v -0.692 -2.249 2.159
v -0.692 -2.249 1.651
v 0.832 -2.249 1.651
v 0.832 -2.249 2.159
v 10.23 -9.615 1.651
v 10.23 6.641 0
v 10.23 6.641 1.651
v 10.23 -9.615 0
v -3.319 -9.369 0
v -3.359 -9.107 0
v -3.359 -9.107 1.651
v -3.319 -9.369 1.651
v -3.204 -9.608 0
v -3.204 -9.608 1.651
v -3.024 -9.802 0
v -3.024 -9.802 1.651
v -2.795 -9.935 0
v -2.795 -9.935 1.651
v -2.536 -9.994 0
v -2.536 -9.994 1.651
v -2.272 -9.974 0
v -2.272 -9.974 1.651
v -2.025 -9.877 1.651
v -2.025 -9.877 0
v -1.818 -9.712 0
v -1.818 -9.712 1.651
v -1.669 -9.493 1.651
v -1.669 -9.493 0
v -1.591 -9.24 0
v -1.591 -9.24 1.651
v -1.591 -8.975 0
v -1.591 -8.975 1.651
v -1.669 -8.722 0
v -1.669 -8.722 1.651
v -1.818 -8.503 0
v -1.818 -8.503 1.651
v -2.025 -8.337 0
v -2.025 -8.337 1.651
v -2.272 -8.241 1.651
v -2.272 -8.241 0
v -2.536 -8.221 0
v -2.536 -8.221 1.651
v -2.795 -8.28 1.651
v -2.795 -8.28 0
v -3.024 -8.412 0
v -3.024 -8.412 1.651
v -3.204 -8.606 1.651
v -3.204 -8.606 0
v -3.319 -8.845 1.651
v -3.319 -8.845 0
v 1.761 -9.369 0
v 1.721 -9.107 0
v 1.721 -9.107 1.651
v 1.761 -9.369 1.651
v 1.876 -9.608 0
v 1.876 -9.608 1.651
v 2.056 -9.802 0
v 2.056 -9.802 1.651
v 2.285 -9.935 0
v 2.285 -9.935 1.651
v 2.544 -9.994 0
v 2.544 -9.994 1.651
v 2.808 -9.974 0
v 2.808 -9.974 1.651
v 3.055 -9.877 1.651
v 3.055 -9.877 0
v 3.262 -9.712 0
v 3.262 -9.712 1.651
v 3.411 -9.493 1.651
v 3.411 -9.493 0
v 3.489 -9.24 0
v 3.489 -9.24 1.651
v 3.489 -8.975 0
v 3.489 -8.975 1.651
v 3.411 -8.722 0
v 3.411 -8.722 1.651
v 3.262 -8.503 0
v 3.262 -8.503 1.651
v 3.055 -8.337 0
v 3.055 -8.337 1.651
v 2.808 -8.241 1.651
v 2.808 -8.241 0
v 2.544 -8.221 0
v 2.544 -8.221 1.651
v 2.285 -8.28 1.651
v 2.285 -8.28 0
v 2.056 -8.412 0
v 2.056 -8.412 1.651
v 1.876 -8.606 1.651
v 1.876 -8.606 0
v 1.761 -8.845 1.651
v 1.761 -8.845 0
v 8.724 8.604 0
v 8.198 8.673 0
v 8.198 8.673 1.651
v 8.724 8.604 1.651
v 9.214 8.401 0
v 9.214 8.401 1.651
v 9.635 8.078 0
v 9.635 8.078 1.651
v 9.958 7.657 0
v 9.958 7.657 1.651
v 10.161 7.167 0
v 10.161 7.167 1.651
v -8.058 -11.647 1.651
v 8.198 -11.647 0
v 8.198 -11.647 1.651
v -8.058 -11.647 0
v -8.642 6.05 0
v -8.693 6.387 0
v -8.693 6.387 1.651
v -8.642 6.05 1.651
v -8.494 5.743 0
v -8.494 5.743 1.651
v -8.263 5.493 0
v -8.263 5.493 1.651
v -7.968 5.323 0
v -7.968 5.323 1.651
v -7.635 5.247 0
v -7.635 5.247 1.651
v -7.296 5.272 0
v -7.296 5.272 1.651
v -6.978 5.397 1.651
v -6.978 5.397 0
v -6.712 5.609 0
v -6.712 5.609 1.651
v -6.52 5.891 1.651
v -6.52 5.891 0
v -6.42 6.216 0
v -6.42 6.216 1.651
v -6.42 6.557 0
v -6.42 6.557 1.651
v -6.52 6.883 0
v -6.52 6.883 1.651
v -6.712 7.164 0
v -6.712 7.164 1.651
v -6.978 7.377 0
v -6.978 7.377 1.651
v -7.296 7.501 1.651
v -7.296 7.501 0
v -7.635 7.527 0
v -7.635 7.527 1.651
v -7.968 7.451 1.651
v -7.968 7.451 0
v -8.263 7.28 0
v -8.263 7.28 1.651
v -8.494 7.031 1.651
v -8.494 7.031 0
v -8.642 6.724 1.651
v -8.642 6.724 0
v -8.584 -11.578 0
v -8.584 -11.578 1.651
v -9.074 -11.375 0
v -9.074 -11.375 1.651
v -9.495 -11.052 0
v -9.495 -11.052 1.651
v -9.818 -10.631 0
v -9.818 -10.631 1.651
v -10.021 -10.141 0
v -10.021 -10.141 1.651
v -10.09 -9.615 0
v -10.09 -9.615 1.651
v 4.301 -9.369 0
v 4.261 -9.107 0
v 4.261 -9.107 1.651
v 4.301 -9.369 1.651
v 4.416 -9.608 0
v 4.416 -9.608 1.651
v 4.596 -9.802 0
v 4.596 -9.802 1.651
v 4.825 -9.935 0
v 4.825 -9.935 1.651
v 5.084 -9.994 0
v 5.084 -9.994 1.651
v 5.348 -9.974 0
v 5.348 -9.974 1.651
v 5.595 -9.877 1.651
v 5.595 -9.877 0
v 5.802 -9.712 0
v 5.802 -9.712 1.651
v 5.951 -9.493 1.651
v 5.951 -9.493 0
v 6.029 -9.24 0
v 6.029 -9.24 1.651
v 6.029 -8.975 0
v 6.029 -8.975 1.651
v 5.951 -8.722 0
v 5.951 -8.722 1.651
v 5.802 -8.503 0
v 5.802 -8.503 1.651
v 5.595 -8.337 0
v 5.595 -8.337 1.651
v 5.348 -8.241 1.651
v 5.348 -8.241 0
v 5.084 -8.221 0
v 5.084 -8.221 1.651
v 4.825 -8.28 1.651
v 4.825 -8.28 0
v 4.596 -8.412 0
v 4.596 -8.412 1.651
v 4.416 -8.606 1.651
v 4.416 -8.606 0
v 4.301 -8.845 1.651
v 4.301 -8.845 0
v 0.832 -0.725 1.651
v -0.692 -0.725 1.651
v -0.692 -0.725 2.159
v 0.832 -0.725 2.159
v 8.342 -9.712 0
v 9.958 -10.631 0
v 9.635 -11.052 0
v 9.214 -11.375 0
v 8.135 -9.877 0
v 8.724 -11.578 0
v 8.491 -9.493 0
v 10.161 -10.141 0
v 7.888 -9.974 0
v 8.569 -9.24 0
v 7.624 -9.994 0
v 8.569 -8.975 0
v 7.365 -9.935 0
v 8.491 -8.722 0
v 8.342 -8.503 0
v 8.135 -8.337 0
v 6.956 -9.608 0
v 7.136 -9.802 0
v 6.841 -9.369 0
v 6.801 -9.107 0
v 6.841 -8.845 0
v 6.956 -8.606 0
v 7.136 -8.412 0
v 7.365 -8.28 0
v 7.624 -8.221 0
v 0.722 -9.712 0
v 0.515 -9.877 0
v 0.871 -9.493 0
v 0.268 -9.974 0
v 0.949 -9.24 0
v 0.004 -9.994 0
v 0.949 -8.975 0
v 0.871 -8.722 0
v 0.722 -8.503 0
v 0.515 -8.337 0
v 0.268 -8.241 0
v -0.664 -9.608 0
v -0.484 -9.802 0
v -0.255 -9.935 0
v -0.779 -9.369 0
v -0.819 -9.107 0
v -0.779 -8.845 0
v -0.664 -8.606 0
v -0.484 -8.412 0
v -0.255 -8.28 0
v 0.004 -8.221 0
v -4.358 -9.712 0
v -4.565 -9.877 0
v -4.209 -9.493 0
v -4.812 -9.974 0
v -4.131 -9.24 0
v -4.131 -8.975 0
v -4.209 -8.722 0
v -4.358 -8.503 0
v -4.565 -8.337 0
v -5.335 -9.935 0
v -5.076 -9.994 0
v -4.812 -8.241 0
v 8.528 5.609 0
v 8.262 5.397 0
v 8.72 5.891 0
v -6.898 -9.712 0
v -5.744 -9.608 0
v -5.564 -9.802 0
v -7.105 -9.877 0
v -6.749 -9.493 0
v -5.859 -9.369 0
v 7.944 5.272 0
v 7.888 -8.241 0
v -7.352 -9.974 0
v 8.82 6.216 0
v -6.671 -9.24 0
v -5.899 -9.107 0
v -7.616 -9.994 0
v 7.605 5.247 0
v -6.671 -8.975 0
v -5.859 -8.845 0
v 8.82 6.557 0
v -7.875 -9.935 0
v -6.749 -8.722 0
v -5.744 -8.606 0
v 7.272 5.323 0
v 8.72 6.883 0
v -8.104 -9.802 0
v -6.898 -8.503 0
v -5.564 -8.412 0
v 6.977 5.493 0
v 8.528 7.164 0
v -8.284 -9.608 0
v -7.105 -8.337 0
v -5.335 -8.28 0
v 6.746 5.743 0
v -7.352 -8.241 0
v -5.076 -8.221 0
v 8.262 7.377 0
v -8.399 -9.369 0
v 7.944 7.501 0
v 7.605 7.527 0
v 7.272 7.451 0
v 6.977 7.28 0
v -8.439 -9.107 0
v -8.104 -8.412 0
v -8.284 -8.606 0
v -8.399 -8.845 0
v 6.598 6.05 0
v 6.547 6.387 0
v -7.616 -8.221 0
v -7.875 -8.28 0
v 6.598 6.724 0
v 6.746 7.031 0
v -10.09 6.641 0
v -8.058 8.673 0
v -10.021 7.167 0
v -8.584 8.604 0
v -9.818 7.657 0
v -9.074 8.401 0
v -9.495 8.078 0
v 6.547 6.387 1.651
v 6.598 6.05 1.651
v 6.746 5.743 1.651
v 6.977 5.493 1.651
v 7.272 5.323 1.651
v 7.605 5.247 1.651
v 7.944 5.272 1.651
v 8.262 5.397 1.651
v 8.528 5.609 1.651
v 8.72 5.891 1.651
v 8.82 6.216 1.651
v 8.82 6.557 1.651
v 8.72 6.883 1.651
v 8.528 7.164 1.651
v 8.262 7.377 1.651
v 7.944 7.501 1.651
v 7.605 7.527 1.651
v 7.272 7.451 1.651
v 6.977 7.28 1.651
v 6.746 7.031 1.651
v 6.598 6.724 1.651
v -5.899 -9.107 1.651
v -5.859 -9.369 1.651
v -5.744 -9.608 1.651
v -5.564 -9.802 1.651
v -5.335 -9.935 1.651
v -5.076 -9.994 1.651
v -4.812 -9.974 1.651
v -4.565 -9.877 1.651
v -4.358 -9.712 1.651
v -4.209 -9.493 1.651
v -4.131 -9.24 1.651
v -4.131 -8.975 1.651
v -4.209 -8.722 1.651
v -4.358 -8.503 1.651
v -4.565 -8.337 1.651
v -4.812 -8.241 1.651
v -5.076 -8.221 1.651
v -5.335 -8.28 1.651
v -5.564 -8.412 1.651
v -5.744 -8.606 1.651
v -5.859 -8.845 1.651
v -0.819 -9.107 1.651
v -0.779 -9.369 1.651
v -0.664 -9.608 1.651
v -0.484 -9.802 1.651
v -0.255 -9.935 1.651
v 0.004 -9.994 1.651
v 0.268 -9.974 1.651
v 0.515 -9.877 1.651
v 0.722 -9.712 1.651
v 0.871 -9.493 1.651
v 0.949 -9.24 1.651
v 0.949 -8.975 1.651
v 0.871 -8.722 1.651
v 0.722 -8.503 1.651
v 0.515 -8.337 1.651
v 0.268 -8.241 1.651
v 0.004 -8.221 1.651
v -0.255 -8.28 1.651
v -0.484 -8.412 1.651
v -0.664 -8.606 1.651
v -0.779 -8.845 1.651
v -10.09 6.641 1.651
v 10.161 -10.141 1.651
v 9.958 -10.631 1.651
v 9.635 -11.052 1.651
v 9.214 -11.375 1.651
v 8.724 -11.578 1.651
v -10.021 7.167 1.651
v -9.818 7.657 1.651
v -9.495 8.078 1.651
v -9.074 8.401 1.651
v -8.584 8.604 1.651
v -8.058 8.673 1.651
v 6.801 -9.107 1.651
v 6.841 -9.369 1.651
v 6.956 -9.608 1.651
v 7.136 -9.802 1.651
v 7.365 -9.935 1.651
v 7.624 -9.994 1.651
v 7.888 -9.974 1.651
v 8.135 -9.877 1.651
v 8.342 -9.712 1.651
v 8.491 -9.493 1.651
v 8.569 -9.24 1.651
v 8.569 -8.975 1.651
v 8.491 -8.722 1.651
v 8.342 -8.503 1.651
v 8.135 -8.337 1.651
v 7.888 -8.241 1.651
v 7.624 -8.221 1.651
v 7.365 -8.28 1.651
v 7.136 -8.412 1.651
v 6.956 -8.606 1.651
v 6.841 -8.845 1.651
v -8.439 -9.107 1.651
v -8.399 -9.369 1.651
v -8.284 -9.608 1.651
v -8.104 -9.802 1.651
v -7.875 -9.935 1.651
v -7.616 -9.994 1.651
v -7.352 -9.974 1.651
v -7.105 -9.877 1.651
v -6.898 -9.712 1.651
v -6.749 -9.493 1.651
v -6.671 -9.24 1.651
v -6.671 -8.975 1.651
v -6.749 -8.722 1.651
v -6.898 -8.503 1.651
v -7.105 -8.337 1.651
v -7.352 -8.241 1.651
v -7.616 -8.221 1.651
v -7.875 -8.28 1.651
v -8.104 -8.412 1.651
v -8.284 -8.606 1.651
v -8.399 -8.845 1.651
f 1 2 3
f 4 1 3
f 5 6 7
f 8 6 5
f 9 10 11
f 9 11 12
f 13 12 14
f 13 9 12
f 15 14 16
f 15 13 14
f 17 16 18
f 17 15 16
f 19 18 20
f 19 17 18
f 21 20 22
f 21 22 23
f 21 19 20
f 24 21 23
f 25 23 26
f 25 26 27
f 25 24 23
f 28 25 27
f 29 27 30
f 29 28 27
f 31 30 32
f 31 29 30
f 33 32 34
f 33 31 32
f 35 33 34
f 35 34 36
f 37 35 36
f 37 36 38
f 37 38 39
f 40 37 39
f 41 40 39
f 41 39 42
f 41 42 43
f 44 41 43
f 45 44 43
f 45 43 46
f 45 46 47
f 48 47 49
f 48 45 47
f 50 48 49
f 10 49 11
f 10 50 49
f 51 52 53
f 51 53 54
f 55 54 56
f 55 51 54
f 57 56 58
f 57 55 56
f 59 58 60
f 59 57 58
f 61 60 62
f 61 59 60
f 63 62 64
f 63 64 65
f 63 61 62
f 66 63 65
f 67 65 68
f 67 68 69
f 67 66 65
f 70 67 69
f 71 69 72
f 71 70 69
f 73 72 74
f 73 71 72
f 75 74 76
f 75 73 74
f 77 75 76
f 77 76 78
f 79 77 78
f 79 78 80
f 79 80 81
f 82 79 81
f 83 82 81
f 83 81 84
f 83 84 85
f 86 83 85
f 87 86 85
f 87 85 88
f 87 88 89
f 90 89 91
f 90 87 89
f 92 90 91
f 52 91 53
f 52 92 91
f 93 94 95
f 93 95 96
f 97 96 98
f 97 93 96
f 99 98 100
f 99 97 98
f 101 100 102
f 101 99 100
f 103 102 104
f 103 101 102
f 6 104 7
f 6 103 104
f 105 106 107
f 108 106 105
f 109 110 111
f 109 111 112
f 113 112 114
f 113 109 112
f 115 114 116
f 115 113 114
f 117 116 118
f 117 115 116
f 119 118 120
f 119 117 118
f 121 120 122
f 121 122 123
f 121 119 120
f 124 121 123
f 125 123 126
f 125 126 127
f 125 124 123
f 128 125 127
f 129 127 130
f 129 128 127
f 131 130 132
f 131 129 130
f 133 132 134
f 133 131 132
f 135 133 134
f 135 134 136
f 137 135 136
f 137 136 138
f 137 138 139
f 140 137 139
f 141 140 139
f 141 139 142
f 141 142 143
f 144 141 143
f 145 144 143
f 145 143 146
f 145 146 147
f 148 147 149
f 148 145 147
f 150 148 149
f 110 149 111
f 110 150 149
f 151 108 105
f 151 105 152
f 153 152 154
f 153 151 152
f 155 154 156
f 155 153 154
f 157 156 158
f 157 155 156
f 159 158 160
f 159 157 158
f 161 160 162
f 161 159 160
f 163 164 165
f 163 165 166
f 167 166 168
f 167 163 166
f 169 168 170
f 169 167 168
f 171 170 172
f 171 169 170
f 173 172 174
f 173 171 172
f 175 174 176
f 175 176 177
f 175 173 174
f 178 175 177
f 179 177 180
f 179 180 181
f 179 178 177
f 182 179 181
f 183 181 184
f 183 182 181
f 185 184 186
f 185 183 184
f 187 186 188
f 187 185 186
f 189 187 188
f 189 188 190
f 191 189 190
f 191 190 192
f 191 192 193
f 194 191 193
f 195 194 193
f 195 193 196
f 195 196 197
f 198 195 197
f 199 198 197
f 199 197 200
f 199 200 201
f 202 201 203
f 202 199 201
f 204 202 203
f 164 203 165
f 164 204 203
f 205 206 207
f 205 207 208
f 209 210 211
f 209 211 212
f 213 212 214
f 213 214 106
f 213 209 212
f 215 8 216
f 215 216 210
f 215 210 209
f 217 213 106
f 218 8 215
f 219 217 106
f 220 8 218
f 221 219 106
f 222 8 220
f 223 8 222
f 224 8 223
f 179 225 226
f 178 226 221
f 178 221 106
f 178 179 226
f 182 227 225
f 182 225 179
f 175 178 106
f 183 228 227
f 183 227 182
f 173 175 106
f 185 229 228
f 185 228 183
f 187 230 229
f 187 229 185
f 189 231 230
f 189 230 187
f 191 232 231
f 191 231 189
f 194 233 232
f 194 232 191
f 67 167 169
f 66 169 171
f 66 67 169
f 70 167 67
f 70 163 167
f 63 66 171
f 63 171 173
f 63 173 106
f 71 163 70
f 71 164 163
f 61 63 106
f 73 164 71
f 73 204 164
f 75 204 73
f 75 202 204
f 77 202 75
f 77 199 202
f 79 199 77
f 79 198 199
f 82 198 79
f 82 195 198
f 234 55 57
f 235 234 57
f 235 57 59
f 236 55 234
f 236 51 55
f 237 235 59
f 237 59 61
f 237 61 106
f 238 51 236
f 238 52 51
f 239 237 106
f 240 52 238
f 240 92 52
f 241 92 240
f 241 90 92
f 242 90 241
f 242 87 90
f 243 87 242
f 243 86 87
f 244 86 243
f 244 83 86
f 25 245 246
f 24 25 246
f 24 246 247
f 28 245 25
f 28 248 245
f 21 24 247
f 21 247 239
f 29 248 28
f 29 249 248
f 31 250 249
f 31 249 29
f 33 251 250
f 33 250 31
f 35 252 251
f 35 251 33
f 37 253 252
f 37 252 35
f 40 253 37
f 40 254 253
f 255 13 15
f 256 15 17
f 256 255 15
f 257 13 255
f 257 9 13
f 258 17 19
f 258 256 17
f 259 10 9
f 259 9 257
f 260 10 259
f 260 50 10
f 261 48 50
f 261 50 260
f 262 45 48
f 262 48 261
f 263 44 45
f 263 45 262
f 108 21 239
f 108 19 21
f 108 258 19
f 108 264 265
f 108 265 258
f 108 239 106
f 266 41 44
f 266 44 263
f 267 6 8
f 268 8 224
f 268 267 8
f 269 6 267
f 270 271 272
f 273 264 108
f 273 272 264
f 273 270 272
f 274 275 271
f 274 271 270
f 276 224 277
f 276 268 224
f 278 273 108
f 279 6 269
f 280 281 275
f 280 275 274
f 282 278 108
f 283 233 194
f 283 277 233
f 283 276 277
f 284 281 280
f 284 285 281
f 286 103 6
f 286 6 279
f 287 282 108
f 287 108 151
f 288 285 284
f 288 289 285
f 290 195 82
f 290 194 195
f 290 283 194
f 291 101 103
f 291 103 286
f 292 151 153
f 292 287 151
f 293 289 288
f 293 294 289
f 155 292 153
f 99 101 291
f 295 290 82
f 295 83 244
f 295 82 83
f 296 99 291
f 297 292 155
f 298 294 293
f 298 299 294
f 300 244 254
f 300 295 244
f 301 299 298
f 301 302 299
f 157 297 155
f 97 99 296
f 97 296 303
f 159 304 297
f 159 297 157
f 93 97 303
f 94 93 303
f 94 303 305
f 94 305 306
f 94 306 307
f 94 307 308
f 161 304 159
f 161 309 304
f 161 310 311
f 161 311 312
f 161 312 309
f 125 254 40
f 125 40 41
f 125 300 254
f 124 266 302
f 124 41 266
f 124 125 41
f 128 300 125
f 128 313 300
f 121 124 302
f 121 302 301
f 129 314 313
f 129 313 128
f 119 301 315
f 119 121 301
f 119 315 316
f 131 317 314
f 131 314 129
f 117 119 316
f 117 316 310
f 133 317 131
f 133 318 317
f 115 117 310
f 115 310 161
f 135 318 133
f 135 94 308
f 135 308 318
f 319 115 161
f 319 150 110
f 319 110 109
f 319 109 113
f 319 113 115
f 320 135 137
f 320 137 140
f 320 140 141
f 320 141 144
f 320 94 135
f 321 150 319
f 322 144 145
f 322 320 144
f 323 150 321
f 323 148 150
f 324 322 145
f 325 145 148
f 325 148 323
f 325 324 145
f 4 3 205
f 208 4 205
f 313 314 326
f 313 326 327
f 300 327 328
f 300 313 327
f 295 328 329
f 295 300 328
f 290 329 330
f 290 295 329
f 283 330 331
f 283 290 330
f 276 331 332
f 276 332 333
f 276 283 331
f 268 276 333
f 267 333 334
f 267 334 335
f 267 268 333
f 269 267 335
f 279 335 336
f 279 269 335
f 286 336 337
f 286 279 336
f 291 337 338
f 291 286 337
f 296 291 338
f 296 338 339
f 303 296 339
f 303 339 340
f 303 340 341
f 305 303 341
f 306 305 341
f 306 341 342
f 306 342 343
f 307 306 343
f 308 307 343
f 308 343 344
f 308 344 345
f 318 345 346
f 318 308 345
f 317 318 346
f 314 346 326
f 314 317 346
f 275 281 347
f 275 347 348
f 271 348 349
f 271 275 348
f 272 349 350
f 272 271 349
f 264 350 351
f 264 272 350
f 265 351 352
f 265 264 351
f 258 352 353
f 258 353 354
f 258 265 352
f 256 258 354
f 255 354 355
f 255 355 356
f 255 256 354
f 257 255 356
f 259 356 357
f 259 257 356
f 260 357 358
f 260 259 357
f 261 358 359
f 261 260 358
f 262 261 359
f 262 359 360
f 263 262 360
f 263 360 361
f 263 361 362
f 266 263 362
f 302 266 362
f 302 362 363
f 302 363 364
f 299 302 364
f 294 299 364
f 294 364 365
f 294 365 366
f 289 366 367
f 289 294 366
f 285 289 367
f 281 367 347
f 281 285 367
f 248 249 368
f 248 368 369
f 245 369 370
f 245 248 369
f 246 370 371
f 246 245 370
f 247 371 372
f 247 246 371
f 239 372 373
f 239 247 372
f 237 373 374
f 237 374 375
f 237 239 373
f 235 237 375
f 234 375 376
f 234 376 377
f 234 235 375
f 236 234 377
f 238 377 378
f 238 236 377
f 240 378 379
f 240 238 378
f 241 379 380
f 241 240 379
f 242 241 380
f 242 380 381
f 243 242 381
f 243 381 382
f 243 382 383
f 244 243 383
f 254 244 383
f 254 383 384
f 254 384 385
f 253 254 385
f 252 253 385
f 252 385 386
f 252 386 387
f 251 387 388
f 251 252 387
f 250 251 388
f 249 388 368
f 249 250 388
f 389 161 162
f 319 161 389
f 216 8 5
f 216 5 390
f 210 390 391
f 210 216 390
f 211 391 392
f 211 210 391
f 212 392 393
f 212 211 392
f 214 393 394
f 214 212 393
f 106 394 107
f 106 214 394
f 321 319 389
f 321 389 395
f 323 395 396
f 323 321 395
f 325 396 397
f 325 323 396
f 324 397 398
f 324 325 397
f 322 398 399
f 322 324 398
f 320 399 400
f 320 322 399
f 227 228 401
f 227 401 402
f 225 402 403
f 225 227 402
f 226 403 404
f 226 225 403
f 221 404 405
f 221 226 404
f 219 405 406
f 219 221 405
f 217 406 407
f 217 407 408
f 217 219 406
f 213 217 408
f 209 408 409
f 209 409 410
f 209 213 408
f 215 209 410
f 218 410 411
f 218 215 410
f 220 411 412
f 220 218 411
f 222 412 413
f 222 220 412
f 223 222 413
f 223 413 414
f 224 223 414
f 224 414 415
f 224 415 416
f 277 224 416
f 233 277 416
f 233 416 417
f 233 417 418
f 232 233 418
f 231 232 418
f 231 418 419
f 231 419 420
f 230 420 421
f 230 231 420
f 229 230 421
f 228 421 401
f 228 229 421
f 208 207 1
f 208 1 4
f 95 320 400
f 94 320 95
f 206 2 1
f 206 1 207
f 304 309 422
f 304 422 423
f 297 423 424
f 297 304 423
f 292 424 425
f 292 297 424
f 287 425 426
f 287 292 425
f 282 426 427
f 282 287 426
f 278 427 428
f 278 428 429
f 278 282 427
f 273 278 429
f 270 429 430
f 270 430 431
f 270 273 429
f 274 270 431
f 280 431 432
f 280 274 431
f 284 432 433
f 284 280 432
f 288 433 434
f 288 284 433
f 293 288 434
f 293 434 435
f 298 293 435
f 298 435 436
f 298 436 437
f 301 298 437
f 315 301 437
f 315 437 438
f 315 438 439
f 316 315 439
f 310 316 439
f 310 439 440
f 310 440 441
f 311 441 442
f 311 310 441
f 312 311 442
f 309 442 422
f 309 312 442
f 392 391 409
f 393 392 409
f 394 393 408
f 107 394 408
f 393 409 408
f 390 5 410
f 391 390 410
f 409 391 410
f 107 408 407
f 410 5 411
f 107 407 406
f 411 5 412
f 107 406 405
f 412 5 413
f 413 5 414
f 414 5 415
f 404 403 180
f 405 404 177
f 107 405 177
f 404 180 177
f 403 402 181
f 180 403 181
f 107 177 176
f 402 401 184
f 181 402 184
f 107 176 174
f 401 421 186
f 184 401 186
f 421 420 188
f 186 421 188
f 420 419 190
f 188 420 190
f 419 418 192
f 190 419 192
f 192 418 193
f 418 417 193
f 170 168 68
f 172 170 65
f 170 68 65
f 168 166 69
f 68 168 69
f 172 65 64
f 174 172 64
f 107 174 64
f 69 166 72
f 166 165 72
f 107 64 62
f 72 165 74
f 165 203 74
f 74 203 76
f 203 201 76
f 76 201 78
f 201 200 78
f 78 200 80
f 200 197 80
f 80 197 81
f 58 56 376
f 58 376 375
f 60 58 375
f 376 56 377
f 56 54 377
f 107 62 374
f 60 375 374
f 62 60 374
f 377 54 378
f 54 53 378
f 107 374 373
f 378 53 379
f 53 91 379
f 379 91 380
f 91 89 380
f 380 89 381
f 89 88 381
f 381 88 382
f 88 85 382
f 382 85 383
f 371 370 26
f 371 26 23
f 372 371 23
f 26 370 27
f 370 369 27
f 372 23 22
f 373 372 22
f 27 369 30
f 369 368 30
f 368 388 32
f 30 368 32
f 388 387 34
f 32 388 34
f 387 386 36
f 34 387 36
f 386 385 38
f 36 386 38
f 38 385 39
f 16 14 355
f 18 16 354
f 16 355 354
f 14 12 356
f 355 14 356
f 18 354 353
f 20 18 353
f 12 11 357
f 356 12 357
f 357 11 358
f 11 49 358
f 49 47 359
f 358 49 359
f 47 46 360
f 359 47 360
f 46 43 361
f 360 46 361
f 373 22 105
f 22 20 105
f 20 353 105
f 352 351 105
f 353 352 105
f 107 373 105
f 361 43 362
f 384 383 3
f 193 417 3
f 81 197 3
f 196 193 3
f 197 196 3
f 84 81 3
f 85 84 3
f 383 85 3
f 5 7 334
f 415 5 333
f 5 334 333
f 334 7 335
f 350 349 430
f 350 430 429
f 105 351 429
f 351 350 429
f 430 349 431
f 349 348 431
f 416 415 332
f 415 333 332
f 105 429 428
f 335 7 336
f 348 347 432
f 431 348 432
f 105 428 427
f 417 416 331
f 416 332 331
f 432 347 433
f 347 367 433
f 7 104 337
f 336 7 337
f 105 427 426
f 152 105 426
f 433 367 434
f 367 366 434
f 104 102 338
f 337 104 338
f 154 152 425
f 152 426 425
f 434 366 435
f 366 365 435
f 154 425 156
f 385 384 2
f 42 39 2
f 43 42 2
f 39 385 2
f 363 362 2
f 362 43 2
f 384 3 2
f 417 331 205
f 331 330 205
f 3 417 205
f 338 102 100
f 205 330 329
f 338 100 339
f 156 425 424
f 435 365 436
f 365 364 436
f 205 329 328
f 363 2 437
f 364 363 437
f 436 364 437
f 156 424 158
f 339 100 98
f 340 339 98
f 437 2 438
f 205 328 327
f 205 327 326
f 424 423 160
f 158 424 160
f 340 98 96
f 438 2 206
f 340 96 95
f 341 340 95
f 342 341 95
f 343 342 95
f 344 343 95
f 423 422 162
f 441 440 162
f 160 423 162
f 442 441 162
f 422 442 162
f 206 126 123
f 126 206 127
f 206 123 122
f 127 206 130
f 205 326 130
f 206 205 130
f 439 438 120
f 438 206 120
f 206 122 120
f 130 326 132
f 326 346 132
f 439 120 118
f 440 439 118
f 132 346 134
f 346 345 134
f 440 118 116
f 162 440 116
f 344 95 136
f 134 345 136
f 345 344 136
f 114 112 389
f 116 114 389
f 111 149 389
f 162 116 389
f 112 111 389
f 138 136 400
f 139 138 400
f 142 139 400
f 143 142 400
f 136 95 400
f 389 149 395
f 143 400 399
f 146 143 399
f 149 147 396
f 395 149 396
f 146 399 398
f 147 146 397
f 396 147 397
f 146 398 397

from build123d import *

# Parameters (mm, degrees)
SKETCH1_R           = 1.143
SKETCH1_R_2         = 0.889
BOSS_EXTRUDE1_DEPTH = 1.651
SKETCH2_W           = 1.524
SKETCH2_H           = 1.524
BOSS_EXTRUDE2_DEPTH = 0.508


with BuildPart() as part:
    # Sketch1 → Boss-Extrude1 (new body)
    with BuildSketch(Plane.XY):
        with BuildLine():
            Line((-8.057940151, 8.672775064), (8.198059849, 8.672775064))
            ThreePointArc((8.198059849, 8.672775064), (9.634900828, 8.077616044), (10.230059849, 6.640775064))
            Line((10.230059849, 6.640775064), (10.230059849, -9.615224936))
            ThreePointArc((10.230059849, -9.615224936), (9.634900828, -11.052065915), (8.198059849, -11.647224936))
            Line((8.198059849, -11.647224936), (-8.057940151, -11.647224936))
            ThreePointArc((-8.057940151, -11.647224936), (-9.49478113, -11.052065915), (-10.089940151, -9.615224936))
            Line((-10.089940151, -9.615224936), (-10.089940151, 6.640775064))
            ThreePointArc((-10.089940151, 6.640775064), (-9.49478113, 8.077616044), (-8.057940151, 8.672775064))
        make_face()
        with Locations(Location((-7.549940151, 6.386775064, 0), (0, 0, 180))):
            Circle(SKETCH1_R, mode=Mode.SUBTRACT)
        with Locations(Location((7.690059849, 6.386775064, 0), (0, 0, 180))):
            Circle(SKETCH1_R, mode=Mode.SUBTRACT)
        with Locations(Location((0.070059849, -9.107224936, 0), (0, 0, 180))):
            Circle(SKETCH1_R_2, mode=Mode.SUBTRACT)
        with Locations(Location((2.610059849, -9.107224936, 0), (0, 0, 180))):
            Circle(SKETCH1_R_2, mode=Mode.SUBTRACT)
        with Locations(Location((5.150059849, -9.107224936, 0), (0, 0, 180))):
            Circle(SKETCH1_R_2, mode=Mode.SUBTRACT)
        with Locations(Location((7.690059849, -9.107224936, 0), (0, 0, 180))):
            Circle(SKETCH1_R_2, mode=Mode.SUBTRACT)
        with Locations(Location((-2.469940151, -9.107224936, 0), (0, 0, 180))):
            Circle(SKETCH1_R_2, mode=Mode.SUBTRACT)
        with Locations(Location((-5.009940151, -9.107224936, 0), (0, 0, 180))):
            Circle(SKETCH1_R_2, mode=Mode.SUBTRACT)
        with Locations(Location((-7.549940151, -9.107224936, 0), (0, 0, 180))):
            Circle(SKETCH1_R_2, mode=Mode.SUBTRACT)
    extrude(amount=BOSS_EXTRUDE1_DEPTH)

    # Sketch2 → Boss-Extrude2 (add)
    with BuildSketch(Plane.XY.offset(1.651)):
        with Locations((0.070059849, -1.487224936)):
            Rectangle(SKETCH2_W, SKETCH2_H)
    extrude(amount=BOSS_EXTRUDE2_DEPTH)


solid = part.part
